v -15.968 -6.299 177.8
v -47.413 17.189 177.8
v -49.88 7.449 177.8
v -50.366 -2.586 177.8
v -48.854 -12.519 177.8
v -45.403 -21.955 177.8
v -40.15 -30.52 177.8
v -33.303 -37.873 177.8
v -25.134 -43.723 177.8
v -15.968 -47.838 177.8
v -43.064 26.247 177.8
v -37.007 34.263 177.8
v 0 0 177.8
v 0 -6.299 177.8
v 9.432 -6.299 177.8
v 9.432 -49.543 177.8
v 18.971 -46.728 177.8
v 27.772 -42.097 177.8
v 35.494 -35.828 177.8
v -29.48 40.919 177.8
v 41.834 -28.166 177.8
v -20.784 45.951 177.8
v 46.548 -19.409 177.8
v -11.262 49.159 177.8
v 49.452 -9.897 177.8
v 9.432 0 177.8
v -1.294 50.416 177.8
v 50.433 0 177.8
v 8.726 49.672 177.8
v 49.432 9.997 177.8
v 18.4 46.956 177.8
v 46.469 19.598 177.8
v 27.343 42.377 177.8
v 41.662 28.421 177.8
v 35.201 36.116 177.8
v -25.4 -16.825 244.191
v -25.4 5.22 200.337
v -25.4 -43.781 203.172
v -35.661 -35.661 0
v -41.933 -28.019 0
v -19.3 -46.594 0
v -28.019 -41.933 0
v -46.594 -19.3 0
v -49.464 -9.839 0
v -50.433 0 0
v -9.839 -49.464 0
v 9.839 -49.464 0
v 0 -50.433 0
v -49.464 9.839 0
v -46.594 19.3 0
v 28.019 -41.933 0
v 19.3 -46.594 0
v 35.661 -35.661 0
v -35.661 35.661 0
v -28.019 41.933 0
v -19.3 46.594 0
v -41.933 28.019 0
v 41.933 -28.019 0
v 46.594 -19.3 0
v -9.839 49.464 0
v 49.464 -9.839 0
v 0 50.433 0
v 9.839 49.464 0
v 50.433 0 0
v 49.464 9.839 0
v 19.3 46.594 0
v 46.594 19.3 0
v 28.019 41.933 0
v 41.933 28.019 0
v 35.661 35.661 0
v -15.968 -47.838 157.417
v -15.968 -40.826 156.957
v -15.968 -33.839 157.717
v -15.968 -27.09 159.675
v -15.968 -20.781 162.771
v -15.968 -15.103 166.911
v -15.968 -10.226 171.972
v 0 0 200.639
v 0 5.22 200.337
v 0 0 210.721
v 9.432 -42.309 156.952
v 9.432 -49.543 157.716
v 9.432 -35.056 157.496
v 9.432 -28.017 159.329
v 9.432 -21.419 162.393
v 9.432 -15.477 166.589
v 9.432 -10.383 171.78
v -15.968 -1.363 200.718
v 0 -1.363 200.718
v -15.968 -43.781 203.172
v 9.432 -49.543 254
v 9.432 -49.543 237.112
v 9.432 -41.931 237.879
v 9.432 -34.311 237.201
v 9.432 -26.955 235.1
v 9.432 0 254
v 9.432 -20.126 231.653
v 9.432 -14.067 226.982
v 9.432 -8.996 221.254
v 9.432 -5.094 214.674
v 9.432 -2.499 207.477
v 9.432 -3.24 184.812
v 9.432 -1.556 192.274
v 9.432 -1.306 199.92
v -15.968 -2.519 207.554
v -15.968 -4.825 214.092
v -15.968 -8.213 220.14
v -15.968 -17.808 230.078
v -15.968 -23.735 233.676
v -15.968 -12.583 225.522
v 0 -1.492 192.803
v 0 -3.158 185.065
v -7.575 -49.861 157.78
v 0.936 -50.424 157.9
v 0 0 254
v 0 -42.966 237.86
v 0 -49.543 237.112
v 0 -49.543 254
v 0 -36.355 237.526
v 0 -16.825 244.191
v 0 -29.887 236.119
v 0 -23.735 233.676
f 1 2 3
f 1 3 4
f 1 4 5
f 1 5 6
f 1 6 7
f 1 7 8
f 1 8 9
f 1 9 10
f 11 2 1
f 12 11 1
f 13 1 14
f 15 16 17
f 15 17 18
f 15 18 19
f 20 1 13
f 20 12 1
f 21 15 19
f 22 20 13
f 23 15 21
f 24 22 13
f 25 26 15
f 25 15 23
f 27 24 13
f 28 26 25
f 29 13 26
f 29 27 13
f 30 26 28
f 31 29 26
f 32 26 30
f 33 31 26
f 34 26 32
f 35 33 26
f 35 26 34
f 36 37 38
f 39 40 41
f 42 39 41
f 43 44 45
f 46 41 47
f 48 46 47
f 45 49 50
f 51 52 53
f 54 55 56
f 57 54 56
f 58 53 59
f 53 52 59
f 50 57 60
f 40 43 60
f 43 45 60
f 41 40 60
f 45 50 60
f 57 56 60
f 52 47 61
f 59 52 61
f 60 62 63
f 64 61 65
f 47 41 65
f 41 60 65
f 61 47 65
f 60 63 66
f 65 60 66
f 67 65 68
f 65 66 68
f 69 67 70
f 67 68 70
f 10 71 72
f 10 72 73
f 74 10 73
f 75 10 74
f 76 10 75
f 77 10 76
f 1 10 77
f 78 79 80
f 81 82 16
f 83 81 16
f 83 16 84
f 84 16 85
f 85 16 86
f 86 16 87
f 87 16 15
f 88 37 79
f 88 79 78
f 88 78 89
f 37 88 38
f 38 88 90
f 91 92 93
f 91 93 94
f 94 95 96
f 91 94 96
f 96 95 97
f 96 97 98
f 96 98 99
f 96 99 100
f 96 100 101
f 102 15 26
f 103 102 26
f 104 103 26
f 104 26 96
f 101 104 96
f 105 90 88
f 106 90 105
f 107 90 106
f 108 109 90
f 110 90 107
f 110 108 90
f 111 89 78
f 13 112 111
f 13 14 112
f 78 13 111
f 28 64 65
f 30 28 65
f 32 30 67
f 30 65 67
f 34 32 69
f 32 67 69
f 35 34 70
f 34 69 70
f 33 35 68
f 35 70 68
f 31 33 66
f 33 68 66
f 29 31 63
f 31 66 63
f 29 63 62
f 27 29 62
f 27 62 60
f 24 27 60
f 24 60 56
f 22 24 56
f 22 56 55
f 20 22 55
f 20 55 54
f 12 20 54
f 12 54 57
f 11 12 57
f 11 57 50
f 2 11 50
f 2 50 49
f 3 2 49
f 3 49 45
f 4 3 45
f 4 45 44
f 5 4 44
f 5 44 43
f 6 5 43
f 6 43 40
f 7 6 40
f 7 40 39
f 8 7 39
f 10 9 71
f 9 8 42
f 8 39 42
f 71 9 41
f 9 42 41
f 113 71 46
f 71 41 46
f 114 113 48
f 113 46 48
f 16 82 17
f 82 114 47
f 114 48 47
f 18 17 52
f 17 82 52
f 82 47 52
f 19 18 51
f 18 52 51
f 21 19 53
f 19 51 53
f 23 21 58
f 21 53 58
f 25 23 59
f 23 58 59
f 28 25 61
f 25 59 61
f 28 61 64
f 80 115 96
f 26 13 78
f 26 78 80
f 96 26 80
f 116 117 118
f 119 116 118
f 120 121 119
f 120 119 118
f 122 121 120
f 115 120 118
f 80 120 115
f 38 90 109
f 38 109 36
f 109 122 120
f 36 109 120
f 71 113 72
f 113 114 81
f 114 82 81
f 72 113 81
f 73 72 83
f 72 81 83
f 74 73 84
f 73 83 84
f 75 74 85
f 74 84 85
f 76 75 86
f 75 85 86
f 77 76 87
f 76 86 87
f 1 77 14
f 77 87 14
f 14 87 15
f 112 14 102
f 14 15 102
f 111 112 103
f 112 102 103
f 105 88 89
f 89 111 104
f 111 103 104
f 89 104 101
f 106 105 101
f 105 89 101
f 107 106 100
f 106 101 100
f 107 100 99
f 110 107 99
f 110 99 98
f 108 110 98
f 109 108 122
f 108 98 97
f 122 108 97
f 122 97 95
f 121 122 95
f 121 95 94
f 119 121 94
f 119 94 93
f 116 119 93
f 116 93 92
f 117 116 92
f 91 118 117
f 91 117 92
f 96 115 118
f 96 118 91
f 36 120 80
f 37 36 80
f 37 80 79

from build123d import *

# Parameters (mm, degrees)
F0_R     = 50.432717
F1_DEPTH = 177.8
F2_W     = 9.432334
F2_H     = 49.54281
F3_DEPTH = 76.2
F5_DEPTH = 25.4
F6_R     = 40.466301
F7_DEPTH = 25.4


with BuildPart() as f1:
    # F0 (on Top) → F1 (new body)
    with BuildSketch(Plane.XY):
        Circle(F0_R)
    extrude(amount=F1_DEPTH)

    # F2 (on face) → F3 (join)
    with BuildSketch(Plane.XY.offset(177.8)):
        with Locations((4.716167, -24.771405)):
            Rectangle(F2_W, F2_H)
    extrude(amount=F3_DEPTH)

    # F4 (on face) → F5 (join)
    with BuildSketch(Plane(origin=(0, 0, 0), x_dir=(0, -1, 0), z_dir=(-1, 0, 0))):
        Polygon((16.824646, 244.190742), (-5.220201, 200.336856), (43.780802, 203.172401), align=None)
    extrude(amount=F5_DEPTH)

    # F6 (on face) → F7 (cut)
    with BuildSketch(Plane.YZ.offset(9.432334)):
        with Locations((-41.694514, 197.413847)):
            Circle(F6_R)
    extrude(amount=-F7_DEPTH, mode=Mode.SUBTRACT)


solid = f1.part
